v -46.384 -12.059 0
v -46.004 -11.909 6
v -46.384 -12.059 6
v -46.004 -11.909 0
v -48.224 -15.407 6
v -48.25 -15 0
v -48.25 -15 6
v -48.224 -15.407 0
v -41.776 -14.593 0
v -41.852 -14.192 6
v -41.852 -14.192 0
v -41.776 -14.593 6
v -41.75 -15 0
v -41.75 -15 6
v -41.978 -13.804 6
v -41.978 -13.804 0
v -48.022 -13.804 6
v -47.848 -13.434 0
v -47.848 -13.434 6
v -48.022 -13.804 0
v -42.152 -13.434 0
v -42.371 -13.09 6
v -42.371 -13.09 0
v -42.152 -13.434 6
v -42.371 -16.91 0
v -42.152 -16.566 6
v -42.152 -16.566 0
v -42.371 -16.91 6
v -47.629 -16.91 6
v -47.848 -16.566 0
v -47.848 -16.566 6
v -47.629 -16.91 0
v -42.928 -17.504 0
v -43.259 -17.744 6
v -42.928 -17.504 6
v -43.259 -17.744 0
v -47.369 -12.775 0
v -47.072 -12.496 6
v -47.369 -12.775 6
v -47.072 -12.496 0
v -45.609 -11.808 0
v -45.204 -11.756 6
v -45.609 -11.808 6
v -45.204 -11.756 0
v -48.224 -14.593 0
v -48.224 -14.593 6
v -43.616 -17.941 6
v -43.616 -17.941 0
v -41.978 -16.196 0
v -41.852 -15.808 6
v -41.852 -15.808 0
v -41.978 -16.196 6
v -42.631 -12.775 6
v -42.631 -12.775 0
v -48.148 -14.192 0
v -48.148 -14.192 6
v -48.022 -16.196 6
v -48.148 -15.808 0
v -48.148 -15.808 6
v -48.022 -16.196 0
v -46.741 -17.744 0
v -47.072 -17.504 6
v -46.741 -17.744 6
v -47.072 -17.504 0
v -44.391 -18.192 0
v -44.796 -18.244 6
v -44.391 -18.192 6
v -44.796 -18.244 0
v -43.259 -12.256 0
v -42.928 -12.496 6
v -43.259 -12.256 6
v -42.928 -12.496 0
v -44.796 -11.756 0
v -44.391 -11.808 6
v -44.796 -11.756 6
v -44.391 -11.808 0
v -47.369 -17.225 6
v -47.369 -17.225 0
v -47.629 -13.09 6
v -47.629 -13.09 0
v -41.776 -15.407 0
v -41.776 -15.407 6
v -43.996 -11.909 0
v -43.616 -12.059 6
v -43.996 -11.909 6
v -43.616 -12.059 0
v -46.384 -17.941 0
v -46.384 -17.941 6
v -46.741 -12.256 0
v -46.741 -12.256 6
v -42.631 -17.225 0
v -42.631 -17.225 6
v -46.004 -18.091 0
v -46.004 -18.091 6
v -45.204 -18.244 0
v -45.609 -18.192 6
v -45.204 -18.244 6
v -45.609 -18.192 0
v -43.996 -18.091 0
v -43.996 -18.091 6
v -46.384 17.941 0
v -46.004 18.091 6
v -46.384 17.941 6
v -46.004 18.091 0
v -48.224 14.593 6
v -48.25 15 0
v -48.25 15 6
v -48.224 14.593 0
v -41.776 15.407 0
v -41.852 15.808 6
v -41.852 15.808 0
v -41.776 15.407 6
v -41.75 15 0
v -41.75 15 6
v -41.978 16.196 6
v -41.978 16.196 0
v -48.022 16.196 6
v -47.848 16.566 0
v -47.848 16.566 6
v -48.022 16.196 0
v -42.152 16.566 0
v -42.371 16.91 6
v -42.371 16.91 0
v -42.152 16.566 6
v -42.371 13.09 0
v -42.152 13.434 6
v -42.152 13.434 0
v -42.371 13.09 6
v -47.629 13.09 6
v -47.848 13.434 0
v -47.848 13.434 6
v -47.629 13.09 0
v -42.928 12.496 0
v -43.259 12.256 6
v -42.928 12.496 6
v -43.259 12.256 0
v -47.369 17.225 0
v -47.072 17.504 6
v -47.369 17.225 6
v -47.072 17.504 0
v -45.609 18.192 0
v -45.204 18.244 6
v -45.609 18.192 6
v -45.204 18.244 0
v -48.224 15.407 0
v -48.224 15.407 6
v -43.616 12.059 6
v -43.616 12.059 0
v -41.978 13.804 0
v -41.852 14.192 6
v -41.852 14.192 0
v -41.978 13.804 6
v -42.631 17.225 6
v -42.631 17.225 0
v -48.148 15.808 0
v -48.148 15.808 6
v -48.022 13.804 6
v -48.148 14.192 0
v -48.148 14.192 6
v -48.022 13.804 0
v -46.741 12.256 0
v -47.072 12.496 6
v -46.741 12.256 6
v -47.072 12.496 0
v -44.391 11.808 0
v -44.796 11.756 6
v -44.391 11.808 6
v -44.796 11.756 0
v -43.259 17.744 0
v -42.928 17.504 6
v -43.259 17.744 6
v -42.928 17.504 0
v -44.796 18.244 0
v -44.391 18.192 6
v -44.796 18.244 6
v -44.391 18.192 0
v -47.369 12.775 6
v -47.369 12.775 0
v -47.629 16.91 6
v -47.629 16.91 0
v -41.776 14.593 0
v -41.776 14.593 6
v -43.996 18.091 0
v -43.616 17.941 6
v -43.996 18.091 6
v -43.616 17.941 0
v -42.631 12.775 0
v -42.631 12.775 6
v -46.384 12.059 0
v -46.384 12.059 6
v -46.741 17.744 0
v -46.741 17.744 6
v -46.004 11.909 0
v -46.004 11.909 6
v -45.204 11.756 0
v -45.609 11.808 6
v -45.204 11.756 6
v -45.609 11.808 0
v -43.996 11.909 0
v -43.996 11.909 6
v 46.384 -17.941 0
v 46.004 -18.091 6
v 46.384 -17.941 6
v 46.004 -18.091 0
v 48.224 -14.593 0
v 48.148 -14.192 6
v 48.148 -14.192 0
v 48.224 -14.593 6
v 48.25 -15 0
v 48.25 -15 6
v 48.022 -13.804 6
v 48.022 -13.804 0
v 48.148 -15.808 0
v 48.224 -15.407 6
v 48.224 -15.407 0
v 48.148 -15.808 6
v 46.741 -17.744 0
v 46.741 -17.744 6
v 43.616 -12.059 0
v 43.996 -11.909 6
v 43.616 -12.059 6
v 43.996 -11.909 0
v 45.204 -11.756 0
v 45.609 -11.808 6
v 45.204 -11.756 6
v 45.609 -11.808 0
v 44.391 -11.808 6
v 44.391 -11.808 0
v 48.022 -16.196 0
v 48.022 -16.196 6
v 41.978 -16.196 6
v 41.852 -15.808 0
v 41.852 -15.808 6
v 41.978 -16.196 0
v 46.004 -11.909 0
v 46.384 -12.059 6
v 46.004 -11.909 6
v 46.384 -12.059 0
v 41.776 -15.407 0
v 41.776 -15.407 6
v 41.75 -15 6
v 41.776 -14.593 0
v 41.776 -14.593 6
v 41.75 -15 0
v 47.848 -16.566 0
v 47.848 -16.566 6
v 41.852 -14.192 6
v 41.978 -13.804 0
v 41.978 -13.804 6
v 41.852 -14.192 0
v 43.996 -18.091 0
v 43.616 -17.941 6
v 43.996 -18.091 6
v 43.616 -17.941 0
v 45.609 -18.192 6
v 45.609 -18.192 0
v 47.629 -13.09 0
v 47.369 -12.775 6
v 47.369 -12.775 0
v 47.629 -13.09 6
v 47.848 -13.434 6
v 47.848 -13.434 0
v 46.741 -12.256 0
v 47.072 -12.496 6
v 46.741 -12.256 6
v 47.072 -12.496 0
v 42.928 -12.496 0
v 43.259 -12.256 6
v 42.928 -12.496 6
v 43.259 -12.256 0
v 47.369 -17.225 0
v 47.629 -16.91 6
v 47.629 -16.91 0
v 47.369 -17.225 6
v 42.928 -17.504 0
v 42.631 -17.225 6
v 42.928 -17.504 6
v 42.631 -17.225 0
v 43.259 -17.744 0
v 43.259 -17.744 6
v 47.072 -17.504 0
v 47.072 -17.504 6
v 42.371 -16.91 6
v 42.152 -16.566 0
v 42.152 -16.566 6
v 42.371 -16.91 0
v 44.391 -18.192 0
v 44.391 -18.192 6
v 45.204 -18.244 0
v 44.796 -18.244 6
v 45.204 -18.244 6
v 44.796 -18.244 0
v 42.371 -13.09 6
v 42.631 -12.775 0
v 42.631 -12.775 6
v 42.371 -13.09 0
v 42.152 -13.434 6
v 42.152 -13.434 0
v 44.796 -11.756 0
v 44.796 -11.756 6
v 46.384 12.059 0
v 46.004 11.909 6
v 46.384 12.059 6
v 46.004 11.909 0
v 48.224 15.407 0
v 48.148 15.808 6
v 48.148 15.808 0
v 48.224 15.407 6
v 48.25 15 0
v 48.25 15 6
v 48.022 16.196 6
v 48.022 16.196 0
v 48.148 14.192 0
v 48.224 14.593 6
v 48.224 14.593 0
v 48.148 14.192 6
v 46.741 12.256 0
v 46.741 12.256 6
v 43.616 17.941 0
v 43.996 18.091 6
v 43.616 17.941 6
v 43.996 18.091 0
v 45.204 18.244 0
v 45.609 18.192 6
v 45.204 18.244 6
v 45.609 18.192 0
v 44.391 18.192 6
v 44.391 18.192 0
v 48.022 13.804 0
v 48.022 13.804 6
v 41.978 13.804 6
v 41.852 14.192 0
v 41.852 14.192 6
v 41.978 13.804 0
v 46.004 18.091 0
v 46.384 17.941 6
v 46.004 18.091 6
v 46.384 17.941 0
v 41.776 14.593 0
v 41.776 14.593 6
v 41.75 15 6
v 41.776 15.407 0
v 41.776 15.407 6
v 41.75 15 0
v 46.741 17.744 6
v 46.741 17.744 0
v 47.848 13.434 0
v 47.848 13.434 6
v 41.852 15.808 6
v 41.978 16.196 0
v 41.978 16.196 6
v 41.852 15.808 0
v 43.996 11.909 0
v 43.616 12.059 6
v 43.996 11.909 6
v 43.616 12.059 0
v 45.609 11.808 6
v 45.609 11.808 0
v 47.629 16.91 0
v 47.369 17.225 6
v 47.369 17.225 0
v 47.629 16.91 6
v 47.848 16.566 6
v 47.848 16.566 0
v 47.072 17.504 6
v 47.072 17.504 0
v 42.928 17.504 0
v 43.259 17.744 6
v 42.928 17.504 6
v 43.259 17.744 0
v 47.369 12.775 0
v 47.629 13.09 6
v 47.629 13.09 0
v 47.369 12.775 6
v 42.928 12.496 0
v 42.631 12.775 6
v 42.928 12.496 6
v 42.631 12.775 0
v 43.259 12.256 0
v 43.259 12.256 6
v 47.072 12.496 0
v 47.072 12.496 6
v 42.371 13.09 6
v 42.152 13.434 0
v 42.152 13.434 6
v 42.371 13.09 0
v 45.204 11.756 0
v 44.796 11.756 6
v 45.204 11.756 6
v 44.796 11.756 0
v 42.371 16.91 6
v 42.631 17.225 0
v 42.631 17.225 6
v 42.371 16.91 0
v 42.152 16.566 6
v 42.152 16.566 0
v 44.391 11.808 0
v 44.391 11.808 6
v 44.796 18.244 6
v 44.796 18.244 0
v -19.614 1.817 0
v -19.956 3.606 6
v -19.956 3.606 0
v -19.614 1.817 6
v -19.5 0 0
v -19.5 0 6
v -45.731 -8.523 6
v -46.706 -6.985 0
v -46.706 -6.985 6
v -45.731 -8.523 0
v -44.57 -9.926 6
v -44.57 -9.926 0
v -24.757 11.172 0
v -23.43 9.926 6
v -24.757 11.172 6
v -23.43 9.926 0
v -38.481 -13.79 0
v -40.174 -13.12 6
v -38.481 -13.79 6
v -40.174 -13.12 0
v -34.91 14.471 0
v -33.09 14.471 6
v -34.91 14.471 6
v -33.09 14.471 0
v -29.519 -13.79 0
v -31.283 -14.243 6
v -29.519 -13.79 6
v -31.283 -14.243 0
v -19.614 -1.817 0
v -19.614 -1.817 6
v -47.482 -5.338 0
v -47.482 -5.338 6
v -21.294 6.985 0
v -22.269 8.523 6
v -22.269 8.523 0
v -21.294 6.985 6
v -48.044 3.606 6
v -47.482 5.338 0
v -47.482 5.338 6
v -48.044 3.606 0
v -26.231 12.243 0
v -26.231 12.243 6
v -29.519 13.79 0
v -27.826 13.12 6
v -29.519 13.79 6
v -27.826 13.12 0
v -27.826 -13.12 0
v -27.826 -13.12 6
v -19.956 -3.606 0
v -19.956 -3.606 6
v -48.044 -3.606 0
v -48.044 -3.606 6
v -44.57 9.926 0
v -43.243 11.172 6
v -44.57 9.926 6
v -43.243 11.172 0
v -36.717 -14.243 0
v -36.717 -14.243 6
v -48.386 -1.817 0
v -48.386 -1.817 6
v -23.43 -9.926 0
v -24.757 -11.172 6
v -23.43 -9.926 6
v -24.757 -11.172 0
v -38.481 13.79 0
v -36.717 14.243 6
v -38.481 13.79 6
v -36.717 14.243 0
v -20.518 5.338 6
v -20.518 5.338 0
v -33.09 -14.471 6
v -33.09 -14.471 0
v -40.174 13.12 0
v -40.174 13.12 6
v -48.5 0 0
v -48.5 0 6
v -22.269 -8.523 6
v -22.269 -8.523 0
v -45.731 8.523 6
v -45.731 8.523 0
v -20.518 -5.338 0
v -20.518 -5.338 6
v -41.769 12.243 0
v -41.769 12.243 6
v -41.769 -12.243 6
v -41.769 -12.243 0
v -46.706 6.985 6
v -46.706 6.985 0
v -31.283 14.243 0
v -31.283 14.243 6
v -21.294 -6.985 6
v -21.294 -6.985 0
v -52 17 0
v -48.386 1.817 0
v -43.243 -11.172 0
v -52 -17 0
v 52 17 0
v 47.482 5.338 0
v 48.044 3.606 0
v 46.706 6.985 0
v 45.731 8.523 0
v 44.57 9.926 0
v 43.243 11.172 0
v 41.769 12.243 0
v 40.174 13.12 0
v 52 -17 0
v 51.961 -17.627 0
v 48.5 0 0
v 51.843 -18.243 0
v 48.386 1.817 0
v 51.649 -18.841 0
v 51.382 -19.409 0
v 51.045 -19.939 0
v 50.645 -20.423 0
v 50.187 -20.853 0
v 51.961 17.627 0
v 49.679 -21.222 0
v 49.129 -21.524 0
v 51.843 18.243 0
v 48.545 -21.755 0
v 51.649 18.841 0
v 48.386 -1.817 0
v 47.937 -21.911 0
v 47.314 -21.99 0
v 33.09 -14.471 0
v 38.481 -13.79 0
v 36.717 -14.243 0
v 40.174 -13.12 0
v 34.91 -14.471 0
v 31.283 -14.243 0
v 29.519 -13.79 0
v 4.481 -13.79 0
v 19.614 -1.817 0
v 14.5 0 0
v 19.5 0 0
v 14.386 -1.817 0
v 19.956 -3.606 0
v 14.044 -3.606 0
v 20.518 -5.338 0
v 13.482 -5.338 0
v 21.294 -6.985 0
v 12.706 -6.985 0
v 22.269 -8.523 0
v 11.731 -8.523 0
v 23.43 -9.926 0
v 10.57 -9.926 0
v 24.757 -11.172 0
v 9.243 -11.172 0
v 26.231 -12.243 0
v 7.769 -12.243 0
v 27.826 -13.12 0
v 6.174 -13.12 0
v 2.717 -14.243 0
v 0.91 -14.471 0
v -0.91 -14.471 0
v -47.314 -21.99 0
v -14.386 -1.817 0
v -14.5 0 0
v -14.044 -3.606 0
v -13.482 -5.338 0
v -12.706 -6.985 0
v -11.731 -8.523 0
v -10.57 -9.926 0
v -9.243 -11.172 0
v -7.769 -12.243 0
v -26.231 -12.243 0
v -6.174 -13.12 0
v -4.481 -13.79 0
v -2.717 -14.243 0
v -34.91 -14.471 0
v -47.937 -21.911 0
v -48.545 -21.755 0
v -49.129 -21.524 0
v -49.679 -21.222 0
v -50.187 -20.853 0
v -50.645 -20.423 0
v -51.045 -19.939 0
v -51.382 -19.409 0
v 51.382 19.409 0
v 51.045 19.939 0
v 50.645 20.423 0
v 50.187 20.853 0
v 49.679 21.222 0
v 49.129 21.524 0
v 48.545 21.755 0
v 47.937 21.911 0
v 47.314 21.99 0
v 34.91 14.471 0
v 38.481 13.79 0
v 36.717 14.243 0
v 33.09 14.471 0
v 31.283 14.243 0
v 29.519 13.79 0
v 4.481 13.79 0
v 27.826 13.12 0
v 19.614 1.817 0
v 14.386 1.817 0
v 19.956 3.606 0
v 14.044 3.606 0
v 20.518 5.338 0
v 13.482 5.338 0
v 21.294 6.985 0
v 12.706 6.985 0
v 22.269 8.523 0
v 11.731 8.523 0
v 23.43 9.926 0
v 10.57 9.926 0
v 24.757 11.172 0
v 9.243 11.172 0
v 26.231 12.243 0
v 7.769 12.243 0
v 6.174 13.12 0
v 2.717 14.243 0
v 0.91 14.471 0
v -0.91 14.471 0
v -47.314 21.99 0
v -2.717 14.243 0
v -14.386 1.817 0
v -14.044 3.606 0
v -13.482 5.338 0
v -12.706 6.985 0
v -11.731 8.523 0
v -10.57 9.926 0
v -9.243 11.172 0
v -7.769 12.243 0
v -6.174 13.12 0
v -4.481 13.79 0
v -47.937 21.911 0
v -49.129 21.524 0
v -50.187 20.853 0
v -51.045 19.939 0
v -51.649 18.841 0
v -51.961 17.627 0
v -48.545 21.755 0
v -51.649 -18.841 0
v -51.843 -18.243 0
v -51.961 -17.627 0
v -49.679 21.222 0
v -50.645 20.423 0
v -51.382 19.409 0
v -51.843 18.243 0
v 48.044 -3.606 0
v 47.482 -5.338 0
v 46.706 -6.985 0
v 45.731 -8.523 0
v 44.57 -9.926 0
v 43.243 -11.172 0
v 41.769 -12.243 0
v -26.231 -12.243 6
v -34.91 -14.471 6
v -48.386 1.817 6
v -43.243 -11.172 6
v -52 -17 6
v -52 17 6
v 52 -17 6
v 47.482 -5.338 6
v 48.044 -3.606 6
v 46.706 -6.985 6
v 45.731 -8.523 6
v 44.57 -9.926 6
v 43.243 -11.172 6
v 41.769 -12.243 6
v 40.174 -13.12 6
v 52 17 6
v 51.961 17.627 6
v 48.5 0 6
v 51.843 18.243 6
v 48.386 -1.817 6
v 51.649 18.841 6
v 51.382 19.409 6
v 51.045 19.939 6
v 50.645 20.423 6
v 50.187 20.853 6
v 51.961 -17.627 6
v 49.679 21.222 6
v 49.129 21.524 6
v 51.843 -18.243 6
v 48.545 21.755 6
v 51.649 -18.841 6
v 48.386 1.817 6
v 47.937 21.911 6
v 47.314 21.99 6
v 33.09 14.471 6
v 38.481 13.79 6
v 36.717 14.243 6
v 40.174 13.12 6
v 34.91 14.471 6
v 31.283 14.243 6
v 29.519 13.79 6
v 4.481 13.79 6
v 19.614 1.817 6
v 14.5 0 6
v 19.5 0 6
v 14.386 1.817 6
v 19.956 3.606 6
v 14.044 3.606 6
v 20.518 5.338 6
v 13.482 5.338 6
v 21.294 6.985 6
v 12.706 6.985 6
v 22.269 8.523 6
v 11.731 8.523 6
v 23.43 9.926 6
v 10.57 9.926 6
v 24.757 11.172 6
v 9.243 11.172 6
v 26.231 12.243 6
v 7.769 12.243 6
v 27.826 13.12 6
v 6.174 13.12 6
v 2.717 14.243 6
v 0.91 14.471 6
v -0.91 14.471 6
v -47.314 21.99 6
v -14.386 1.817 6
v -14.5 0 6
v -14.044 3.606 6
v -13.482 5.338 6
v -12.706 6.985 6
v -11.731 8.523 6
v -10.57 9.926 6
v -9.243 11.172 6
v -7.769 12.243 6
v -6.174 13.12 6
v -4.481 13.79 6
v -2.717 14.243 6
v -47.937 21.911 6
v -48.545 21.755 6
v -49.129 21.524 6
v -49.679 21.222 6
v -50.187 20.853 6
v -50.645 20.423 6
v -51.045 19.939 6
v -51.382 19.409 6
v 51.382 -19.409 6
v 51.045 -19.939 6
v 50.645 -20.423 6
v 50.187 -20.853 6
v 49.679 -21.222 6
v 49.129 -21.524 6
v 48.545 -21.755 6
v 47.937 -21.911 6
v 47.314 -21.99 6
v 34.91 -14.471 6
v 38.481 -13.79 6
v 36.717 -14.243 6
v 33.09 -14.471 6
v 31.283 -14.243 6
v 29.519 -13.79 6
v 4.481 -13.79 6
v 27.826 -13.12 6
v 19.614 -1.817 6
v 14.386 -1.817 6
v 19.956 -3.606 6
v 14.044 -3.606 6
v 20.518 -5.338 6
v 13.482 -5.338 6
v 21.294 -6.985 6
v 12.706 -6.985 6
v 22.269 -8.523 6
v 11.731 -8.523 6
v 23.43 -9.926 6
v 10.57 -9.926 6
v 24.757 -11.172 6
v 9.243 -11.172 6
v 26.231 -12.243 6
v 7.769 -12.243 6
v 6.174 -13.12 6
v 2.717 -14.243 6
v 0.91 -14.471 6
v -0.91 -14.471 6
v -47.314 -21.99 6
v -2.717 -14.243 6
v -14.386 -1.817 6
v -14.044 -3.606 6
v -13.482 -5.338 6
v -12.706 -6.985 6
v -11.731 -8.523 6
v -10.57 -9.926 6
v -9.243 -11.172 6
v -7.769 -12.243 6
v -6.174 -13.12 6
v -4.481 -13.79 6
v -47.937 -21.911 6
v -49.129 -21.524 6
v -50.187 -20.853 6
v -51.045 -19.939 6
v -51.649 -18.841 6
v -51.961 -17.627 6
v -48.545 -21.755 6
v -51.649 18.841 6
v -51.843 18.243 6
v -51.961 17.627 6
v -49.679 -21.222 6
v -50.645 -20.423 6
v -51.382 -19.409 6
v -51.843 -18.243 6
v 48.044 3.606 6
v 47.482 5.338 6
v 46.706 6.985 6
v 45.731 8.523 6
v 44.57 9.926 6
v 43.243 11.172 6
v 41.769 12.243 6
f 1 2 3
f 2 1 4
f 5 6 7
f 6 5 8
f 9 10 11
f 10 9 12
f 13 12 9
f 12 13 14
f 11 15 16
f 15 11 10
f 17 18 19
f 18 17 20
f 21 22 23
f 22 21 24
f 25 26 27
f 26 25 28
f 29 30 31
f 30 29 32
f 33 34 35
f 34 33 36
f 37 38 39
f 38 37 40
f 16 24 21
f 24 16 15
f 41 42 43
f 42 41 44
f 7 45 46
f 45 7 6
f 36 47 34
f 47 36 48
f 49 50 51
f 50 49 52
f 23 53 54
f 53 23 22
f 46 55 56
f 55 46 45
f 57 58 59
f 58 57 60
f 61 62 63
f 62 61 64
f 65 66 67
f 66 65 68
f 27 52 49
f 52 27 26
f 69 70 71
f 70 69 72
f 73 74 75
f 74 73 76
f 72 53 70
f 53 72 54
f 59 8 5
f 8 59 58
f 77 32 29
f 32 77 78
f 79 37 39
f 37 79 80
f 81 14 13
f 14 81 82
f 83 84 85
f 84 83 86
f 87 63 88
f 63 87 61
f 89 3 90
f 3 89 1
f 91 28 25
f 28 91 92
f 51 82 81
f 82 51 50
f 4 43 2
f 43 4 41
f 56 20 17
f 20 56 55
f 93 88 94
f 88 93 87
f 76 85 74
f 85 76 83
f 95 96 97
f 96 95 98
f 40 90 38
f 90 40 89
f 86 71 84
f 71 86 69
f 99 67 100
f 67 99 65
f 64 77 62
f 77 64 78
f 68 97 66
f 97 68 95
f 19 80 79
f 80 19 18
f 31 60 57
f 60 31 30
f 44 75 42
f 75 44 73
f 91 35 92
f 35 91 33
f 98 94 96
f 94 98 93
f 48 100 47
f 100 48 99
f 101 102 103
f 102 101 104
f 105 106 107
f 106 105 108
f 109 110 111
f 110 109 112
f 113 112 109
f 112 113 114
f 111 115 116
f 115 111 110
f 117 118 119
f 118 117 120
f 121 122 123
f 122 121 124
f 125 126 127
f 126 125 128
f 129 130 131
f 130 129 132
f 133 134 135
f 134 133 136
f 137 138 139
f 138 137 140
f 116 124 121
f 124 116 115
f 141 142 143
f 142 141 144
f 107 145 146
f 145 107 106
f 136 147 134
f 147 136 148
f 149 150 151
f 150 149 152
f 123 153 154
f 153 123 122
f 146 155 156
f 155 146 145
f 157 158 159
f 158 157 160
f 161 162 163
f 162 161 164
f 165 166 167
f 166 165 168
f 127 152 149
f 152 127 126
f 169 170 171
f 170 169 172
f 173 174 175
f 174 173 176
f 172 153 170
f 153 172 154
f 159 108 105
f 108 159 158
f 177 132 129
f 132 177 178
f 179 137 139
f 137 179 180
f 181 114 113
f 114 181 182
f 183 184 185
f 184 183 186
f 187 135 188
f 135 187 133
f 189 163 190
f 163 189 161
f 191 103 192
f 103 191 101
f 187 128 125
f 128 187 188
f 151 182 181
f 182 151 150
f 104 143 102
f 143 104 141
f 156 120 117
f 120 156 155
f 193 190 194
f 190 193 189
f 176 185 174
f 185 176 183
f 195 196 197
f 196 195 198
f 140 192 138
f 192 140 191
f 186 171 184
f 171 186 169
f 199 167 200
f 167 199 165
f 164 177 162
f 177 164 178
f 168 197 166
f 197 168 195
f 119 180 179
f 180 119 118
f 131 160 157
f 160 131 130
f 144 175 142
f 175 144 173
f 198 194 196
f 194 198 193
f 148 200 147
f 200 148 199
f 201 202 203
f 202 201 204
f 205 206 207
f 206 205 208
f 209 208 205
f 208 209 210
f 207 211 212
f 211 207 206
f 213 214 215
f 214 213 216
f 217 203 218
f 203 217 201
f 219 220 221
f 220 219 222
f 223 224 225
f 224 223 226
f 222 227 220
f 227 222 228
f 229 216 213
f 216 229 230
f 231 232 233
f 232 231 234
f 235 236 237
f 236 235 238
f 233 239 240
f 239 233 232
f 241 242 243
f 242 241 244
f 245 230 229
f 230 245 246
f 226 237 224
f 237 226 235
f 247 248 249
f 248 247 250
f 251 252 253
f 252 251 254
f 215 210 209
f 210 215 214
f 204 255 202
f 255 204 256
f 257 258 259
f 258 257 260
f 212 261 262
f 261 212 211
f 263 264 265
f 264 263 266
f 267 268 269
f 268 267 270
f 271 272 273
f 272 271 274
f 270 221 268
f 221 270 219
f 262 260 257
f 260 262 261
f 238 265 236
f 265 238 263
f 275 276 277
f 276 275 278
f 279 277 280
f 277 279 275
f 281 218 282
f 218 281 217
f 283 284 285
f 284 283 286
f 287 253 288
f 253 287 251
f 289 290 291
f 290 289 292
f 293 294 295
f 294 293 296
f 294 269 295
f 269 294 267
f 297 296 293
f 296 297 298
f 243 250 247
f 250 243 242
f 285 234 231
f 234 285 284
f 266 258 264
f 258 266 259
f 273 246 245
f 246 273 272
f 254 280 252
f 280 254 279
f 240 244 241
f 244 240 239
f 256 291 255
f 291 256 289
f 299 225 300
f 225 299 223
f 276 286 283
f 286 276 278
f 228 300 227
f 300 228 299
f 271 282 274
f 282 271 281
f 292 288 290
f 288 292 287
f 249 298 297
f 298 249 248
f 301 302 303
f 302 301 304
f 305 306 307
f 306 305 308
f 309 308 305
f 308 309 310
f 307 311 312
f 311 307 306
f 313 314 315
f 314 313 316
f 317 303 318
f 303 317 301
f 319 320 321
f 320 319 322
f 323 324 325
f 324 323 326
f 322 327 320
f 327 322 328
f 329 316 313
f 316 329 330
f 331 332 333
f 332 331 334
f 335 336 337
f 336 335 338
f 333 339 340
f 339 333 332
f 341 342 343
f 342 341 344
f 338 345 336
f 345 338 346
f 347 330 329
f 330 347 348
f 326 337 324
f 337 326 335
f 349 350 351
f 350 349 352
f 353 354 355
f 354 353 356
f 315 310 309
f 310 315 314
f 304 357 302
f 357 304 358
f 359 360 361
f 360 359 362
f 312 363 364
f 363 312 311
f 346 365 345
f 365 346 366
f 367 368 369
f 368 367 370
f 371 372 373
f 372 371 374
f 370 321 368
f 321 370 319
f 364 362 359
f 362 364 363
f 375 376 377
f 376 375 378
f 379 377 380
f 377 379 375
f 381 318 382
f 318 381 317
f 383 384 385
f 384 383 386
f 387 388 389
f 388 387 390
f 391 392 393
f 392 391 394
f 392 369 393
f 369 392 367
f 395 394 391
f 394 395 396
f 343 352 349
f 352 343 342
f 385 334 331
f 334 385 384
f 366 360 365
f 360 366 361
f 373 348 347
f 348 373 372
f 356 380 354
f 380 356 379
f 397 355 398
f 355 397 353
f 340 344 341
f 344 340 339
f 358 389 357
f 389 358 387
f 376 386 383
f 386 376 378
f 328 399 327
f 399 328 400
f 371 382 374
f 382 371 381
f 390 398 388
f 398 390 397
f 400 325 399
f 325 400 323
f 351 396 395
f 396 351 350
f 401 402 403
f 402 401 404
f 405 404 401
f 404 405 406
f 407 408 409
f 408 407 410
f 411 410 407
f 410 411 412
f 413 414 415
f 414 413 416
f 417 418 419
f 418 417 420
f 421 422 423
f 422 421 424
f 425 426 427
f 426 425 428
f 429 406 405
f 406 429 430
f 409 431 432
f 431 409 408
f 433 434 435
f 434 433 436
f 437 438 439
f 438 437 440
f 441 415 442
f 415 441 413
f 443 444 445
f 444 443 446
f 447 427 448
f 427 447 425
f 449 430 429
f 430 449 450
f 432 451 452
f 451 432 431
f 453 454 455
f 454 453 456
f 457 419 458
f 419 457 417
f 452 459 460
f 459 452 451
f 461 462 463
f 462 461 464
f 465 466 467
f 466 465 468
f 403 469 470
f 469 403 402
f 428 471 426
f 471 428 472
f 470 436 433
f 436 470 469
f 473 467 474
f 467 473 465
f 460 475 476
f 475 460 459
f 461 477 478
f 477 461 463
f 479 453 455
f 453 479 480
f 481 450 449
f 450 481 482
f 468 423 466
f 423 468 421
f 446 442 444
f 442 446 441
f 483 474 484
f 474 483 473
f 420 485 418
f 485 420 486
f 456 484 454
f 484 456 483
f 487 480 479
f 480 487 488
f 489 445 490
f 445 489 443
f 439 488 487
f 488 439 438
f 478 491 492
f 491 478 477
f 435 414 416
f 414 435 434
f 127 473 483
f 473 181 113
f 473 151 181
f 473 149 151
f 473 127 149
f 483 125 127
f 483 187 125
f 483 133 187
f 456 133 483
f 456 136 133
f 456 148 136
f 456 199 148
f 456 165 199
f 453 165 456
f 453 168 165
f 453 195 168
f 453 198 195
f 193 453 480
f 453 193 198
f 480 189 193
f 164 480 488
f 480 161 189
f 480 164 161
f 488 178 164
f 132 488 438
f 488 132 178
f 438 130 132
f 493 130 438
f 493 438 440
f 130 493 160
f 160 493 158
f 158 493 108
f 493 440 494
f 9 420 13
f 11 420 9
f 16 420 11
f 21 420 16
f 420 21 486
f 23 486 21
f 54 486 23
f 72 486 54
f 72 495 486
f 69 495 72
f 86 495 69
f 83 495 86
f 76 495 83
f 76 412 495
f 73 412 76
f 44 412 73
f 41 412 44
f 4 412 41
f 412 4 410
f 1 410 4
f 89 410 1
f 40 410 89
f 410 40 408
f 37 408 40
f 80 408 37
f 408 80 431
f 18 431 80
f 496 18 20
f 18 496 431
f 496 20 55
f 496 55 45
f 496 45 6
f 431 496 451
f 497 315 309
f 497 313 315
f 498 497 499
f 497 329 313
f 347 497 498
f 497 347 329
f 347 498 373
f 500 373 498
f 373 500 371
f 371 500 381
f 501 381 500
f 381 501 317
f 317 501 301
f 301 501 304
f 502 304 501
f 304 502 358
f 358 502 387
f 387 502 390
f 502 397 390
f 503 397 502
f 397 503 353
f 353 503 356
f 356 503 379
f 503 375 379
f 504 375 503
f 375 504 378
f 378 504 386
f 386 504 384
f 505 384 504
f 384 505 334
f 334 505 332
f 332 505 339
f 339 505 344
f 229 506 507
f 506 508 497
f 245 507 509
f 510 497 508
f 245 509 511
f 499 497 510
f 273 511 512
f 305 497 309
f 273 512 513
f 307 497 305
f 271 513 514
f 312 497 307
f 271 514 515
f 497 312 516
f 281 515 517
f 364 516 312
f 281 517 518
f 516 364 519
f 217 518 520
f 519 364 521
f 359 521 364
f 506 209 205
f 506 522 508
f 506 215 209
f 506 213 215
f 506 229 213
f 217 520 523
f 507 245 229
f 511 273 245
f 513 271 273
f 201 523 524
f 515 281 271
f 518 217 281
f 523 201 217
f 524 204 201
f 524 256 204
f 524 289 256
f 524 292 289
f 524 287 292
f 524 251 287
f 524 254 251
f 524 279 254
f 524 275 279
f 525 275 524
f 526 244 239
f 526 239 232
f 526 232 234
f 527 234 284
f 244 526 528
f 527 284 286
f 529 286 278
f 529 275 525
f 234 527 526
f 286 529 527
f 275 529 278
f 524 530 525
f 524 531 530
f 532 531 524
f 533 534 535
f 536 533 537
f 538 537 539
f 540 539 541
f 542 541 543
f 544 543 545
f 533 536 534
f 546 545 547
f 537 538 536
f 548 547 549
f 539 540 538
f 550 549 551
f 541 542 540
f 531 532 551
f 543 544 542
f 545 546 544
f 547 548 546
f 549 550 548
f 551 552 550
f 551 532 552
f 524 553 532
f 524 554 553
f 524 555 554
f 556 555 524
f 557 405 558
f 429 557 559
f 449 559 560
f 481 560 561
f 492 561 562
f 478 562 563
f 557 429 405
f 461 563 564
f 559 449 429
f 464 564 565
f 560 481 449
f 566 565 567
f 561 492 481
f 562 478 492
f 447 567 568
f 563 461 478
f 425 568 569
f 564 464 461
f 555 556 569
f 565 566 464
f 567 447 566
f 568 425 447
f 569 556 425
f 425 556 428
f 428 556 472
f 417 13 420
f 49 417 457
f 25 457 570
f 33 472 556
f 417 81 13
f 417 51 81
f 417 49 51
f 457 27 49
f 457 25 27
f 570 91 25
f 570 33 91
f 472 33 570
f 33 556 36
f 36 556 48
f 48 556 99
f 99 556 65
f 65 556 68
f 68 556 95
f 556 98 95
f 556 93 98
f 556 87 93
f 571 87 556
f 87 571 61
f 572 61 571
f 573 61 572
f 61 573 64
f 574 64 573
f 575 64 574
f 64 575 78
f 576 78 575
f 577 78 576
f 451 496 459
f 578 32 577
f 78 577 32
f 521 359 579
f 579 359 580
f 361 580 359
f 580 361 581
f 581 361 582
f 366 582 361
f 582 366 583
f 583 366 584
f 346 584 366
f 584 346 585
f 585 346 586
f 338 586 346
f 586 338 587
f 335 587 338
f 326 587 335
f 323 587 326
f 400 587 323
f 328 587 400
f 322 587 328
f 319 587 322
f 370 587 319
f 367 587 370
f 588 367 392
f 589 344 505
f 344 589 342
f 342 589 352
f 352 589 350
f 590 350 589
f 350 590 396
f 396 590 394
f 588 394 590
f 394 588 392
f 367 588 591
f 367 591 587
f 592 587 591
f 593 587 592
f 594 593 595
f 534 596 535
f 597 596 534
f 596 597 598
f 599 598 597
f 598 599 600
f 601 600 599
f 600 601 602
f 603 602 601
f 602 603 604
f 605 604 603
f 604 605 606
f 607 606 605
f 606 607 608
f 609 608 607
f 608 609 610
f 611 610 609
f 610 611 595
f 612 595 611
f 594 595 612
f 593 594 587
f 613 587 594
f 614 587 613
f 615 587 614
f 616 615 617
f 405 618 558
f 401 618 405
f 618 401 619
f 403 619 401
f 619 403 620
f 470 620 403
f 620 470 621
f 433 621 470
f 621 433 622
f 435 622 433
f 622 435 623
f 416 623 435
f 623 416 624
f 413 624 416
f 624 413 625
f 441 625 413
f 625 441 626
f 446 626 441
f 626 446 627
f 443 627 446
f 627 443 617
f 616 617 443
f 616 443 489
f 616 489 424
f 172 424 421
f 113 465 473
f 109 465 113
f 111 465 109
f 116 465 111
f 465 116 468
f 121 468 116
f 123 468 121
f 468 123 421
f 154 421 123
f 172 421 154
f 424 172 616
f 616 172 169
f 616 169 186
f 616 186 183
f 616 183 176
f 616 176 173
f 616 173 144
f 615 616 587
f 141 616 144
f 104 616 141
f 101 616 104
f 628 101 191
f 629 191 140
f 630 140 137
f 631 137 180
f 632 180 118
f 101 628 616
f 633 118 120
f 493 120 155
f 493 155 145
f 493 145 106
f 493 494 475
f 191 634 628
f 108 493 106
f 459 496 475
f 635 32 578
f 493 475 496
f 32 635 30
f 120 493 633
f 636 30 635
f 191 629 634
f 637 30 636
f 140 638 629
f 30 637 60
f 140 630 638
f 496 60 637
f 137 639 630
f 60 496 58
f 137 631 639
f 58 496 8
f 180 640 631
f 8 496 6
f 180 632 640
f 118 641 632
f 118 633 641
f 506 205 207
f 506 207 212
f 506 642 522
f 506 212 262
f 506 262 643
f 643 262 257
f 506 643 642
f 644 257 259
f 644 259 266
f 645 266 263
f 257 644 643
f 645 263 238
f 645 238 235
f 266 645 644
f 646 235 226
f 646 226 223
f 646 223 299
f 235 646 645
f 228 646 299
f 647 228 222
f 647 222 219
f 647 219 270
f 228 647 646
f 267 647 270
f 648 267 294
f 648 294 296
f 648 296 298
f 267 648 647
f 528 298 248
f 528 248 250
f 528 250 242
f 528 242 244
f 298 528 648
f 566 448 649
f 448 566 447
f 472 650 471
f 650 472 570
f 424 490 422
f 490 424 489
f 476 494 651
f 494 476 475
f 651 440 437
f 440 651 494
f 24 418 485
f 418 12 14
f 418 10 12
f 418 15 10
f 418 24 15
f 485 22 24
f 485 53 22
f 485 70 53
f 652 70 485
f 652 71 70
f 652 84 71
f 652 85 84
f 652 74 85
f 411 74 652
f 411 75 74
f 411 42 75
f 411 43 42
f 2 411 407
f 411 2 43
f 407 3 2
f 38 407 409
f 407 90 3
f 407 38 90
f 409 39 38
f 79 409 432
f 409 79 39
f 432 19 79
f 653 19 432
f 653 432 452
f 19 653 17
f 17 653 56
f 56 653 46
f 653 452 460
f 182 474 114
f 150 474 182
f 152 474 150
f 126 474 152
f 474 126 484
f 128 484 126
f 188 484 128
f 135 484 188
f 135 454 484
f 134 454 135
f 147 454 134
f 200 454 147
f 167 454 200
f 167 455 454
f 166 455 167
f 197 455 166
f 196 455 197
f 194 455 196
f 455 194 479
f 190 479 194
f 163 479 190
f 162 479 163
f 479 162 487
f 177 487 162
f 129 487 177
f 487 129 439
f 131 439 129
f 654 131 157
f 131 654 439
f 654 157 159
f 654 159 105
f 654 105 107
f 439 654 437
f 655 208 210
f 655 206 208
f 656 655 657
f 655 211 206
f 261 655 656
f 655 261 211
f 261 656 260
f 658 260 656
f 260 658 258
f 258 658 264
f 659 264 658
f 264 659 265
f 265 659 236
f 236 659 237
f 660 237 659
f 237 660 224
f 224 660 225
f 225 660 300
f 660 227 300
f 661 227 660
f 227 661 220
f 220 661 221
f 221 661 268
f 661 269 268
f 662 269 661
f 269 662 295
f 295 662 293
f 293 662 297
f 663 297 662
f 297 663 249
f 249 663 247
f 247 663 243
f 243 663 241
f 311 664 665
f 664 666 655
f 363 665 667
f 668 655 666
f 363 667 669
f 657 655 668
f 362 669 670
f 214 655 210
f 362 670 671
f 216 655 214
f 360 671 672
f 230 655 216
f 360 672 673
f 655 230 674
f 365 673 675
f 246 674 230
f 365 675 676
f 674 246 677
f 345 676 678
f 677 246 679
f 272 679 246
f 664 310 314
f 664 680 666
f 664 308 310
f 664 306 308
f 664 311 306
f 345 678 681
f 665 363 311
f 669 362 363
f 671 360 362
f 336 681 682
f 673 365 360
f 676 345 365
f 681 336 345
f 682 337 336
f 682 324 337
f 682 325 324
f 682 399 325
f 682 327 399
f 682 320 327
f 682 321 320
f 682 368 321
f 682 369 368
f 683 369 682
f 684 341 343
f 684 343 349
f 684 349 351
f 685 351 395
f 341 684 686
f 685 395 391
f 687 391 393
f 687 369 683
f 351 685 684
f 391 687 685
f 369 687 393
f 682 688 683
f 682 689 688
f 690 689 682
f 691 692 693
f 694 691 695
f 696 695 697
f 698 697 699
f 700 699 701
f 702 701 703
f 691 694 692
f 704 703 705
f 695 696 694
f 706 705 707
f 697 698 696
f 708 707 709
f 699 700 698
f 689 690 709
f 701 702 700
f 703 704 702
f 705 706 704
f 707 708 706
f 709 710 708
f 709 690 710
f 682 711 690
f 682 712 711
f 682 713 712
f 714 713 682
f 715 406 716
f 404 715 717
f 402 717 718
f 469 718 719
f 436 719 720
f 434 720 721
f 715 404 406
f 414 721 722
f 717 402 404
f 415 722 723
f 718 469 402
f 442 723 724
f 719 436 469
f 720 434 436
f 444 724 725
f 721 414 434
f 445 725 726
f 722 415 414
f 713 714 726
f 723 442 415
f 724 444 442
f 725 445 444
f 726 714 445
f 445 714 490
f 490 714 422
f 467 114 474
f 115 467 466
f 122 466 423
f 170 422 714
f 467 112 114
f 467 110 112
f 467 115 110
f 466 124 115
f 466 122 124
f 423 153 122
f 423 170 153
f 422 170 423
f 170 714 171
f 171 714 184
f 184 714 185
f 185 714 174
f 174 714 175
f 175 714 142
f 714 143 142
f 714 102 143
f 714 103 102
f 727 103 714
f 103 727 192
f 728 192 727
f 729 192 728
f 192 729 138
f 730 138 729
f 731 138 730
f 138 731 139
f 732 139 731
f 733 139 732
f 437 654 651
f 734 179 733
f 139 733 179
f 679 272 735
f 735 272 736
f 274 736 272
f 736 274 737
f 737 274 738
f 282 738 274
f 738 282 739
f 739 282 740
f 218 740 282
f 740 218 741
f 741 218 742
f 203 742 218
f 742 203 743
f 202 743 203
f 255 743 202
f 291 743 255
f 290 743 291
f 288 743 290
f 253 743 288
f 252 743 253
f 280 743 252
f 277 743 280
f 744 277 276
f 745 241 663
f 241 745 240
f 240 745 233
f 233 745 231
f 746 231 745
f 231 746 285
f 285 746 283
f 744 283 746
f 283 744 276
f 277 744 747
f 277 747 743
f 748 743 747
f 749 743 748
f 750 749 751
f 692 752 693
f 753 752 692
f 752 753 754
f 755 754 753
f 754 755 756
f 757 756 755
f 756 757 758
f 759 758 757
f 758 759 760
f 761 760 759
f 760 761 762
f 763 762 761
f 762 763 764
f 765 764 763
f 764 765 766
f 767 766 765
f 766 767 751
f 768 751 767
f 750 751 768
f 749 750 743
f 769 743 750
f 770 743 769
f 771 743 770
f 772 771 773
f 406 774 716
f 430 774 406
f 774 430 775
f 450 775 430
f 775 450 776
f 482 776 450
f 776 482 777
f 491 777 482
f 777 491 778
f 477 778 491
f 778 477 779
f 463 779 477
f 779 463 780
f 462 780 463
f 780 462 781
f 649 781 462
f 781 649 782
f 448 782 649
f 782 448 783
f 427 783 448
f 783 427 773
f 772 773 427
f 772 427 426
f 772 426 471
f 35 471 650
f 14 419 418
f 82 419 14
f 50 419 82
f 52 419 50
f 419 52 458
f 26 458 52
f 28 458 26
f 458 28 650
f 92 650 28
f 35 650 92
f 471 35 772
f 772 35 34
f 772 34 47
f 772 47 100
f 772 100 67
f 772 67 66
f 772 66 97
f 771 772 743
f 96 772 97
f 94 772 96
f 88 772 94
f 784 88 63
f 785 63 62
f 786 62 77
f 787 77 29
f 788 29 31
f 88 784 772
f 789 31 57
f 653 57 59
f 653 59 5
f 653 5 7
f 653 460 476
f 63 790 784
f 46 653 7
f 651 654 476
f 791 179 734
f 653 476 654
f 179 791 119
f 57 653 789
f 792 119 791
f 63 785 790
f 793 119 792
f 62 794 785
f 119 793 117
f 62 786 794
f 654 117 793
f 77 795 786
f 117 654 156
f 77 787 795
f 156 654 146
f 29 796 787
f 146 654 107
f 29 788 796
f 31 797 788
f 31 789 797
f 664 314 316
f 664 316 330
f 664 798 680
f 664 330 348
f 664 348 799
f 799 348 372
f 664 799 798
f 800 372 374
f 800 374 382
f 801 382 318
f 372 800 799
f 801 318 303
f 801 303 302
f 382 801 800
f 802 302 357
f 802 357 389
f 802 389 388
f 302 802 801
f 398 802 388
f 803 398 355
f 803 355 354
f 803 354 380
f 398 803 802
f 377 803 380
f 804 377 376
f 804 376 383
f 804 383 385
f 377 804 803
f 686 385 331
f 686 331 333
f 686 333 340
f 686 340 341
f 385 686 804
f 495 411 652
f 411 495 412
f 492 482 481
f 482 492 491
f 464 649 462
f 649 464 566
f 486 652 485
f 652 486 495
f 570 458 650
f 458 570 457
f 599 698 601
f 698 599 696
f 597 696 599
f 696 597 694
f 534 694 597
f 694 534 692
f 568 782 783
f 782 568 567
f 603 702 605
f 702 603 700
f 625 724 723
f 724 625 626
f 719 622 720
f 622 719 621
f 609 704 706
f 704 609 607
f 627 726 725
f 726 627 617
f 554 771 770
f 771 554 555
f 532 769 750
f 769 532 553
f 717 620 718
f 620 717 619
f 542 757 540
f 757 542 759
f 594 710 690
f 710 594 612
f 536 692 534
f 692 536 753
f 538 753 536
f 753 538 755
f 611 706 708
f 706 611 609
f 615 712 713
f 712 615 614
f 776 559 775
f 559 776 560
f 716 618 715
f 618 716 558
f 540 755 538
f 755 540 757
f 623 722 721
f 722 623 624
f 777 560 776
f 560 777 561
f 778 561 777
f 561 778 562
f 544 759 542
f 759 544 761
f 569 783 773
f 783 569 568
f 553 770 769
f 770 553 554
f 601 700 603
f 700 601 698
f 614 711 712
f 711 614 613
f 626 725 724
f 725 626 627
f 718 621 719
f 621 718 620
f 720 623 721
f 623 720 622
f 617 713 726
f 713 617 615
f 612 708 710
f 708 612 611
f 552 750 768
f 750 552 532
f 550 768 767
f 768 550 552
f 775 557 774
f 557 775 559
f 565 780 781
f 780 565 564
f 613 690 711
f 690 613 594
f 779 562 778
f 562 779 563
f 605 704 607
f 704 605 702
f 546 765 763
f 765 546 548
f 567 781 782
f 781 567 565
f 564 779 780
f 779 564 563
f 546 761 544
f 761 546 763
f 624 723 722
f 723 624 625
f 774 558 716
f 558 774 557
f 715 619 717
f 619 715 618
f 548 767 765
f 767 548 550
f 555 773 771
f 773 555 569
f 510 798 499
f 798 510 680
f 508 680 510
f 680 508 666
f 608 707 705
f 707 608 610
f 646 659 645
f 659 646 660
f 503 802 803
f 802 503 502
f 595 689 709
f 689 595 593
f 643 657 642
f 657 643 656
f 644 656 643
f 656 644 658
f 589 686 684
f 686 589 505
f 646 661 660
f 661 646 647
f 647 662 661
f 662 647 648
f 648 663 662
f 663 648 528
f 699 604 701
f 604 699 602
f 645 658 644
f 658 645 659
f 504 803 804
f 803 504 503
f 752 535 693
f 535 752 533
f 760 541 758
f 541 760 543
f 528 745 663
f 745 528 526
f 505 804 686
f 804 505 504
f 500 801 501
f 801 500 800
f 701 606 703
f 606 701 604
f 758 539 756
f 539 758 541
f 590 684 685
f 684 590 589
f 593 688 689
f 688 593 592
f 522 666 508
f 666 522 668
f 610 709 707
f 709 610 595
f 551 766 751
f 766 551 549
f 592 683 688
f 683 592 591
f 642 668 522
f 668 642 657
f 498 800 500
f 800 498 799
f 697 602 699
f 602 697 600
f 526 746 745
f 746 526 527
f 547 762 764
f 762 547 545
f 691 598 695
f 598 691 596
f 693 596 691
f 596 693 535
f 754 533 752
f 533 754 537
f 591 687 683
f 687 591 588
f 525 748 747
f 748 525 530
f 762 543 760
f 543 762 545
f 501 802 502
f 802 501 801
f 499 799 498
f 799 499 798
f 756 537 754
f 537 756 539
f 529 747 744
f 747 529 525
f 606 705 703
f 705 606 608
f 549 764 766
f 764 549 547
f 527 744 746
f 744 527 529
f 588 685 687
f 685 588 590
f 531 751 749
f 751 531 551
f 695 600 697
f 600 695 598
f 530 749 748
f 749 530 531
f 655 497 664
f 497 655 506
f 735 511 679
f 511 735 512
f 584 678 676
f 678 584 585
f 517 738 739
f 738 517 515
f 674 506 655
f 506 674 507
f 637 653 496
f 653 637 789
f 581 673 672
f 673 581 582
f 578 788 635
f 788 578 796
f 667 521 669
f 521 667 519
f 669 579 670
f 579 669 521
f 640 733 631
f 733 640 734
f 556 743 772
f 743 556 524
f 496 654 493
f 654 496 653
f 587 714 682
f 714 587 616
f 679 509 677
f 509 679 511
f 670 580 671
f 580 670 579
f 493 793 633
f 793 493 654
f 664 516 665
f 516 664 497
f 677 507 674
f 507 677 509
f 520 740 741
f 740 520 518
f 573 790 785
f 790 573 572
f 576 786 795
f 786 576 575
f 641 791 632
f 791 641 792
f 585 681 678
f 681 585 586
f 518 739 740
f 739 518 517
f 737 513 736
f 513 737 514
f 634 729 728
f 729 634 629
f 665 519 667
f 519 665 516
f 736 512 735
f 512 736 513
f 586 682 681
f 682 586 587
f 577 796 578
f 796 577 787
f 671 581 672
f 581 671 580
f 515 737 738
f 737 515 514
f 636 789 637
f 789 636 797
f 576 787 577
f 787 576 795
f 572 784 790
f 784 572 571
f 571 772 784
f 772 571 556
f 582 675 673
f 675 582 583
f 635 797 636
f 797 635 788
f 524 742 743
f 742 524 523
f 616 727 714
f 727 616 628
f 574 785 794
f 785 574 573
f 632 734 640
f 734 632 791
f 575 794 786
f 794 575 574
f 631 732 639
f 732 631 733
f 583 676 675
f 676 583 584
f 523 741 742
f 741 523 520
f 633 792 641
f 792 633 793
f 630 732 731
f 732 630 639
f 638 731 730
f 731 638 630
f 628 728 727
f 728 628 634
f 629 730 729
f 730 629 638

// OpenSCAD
$fn = 50;


difference() {
	union() {
		hull() {
			translate(v = [-47.0000000000, 17.0000000000, 0]) {
				cylinder(h = 6, r = 5);
			}
			translate(v = [47.0000000000, 17.0000000000, 0]) {
				cylinder(h = 6, r = 5);
			}
			translate(v = [-47.0000000000, -17.0000000000, 0]) {
				cylinder(h = 6, r = 5);
			}
			translate(v = [47.0000000000, -17.0000000000, 0]) {
				cylinder(h = 6, r = 5);
			}
		}
	}
	union() {
		#translate(v = [-45.0000000000, -15.0000000000, -100.0000000000]) {
			cylinder(h = 200, r = 3.2500000000);
		}
		#translate(v = [-45.0000000000, 15.0000000000, -100.0000000000]) {
			cylinder(h = 200, r = 3.2500000000);
		}
		#translate(v = [45.0000000000, -15.0000000000, -100.0000000000]) {
			cylinder(h = 200, r = 3.2500000000);
		}
		#translate(v = [45.0000000000, 15.0000000000, -100.0000000000]) {
			cylinder(h = 200, r = 3.2500000000);
		}
		#translate(v = [-34.0000000000, 0, 0]) {
			cylinder(h = 6, r = 14.5000000000);
		}
		#cylinder(h = 6, r = 14.5000000000);
		#translate(v = [34.0000000000, 0, 0]) {
			cylinder(h = 6, r = 14.5000000000);
		}
	}
}
